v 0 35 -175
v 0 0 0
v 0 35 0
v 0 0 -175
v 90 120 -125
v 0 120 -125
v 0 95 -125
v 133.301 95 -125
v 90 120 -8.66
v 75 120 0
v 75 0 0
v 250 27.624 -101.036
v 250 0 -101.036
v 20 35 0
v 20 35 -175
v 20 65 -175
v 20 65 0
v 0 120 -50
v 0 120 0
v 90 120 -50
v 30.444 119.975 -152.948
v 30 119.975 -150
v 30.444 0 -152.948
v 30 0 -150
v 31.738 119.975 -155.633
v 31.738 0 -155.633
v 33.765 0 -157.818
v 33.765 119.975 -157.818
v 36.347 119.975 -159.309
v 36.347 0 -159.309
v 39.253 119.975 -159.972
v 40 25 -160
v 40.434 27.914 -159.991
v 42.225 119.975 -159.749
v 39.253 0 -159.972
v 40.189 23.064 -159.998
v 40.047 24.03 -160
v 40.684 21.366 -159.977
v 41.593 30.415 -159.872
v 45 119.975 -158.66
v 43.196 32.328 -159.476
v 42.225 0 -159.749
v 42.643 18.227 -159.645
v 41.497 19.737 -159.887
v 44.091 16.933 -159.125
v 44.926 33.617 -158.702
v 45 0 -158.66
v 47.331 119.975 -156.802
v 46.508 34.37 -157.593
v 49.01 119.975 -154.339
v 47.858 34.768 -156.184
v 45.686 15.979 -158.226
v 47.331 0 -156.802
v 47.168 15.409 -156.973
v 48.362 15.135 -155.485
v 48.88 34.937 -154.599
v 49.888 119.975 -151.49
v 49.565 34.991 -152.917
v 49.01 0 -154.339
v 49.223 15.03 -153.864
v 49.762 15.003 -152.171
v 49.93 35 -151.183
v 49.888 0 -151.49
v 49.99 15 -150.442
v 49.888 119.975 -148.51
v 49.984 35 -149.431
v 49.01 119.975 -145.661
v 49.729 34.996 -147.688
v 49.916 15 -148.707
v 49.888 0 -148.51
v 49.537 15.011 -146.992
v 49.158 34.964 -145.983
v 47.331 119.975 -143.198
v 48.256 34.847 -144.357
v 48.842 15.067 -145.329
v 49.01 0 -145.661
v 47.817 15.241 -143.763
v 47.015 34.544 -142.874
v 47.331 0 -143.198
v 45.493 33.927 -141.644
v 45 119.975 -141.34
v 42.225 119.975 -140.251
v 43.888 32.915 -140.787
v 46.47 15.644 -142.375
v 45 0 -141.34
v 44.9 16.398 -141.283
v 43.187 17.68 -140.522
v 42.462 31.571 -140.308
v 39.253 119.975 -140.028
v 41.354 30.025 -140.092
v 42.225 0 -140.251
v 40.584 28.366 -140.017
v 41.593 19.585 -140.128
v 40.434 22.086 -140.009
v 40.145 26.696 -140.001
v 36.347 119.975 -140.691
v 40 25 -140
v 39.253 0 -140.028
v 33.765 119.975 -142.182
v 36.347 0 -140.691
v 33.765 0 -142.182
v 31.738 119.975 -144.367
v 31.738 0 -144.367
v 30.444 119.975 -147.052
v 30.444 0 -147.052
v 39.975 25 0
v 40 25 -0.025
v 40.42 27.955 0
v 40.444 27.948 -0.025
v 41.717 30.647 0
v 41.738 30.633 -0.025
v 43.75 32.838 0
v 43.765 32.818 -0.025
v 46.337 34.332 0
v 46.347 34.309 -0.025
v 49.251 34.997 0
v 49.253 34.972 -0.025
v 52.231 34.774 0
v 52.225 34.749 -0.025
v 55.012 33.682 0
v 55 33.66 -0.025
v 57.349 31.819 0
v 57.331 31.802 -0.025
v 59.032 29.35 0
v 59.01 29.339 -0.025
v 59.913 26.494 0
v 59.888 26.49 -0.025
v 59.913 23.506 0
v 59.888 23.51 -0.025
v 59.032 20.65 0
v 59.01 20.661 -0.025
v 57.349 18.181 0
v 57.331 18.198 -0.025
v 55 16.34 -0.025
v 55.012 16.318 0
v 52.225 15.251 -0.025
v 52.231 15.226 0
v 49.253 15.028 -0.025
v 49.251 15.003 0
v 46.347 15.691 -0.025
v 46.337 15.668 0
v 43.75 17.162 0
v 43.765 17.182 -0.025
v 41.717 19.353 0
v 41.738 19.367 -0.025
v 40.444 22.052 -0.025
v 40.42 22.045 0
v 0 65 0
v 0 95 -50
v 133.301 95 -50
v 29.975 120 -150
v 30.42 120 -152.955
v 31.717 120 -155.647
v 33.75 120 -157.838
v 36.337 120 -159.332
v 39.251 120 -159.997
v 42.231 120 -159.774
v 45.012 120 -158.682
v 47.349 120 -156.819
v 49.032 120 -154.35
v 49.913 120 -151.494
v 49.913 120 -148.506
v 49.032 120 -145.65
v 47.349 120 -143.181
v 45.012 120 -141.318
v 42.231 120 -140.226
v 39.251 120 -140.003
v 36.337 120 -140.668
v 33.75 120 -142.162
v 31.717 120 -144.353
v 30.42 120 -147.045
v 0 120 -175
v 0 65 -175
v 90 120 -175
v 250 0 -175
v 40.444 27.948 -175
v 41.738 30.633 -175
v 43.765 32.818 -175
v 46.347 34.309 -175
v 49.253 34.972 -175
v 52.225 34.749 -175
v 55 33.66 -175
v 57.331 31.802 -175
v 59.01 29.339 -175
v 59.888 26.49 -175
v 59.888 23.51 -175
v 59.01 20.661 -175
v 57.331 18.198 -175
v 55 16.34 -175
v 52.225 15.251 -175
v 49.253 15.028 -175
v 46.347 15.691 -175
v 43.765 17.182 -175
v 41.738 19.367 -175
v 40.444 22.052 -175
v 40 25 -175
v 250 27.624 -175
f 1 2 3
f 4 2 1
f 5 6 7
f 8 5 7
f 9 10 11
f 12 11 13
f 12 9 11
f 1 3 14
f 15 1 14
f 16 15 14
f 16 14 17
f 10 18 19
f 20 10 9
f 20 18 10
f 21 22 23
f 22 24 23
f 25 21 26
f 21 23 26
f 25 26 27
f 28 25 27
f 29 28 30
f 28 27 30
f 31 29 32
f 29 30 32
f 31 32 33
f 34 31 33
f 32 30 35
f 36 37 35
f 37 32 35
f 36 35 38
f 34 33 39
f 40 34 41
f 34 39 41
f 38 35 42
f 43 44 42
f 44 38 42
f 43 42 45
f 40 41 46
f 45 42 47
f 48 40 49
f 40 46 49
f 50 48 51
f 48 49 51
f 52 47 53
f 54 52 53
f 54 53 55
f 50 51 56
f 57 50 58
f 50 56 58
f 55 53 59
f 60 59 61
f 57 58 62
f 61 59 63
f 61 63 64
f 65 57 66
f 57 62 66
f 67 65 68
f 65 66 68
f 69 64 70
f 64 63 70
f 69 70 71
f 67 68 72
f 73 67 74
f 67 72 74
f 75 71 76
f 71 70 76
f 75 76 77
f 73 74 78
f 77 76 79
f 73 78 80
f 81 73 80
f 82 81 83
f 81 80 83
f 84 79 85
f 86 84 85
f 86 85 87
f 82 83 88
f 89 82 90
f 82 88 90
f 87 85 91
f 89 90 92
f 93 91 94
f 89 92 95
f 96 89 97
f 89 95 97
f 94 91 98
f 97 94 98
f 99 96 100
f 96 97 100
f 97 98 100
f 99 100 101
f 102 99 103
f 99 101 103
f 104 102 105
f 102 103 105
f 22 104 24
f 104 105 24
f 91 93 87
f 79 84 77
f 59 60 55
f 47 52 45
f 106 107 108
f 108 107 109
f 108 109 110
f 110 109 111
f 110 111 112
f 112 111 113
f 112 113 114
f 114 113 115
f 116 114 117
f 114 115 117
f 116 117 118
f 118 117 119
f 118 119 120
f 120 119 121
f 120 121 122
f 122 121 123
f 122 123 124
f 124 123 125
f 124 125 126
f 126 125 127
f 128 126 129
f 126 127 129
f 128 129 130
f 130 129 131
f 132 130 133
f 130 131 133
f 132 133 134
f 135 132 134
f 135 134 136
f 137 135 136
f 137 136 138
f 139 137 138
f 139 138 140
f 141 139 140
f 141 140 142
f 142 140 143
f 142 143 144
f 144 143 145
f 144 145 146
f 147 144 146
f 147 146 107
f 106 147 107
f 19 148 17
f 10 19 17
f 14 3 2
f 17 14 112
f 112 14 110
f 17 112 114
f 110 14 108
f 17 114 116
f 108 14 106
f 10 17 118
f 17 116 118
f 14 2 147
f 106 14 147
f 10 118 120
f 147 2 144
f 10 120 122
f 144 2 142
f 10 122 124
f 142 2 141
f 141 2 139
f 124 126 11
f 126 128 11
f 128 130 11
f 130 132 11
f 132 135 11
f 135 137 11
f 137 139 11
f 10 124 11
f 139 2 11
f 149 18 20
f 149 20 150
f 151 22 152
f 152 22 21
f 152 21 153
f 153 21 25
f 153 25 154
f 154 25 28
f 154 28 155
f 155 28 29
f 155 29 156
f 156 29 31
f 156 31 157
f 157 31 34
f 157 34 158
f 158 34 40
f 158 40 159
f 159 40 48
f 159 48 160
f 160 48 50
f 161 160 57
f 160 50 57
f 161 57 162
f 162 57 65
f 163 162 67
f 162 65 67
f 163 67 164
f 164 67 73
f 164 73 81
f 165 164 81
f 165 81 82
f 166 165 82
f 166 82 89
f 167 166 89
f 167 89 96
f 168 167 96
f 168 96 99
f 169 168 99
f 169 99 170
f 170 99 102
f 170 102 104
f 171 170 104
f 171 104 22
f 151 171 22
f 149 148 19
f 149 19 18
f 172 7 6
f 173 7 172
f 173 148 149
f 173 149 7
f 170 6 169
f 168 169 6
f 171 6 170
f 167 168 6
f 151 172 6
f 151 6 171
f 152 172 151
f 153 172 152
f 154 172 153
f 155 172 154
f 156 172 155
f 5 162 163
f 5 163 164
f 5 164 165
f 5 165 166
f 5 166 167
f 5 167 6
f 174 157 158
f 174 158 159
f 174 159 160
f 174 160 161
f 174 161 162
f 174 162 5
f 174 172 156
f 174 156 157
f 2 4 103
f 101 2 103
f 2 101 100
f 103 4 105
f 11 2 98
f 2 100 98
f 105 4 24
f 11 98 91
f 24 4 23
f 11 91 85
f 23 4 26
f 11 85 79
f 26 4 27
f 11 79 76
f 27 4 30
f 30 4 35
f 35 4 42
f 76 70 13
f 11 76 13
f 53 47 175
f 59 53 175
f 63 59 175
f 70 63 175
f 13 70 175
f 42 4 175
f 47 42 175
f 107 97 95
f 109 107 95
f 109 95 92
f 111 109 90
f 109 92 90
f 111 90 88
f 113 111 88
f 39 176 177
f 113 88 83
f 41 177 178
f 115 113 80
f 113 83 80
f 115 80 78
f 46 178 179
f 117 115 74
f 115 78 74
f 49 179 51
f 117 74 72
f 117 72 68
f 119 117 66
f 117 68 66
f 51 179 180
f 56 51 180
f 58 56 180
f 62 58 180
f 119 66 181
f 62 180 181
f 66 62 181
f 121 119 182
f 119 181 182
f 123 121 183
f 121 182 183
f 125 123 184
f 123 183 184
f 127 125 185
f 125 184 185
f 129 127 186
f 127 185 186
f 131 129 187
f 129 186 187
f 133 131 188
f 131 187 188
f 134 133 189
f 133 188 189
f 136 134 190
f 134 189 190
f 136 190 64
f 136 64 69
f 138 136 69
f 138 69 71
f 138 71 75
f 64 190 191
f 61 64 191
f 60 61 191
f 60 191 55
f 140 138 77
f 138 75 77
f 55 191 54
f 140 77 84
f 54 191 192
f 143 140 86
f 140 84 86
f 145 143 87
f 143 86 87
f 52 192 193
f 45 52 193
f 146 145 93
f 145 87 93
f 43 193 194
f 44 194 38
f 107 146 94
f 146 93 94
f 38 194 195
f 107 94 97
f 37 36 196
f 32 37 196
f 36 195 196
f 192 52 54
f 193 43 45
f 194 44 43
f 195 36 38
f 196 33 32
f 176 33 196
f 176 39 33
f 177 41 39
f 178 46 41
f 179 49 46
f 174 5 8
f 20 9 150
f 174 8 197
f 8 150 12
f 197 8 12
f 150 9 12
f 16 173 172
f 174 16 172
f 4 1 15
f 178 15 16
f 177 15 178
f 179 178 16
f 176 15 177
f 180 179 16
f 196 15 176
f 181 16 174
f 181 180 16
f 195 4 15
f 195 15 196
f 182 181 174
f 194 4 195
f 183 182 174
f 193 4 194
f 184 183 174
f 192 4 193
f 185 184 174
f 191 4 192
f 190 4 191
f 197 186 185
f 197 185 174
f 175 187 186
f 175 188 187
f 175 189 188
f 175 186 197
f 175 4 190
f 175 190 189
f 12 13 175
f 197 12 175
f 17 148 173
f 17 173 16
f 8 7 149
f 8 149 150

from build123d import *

# Parameters (mm, degrees)
SKETCH1_W                        = 250
SKETCH1_H                        = 175
BOSS_EXTRUDE1_DEPTH              = 120
SKETCH3_W                        = 250
SKETCH3_H                        = 75
CUT_EXTRUDE1_DEPTH               = 25
CUT_EXTRUDE2_REACH               = 329.91
SKETCH4_W                        = 20
SKETCH4_H                        = 30
F_20_0MM_DOWEL_HOLE1_D           = 20
F_20_0MM_DOWEL_HOLE1_CSINK_D     = 20.05
F_20_0MM_DOWEL_HOLE1_CSINK_ANGLE = 90
F_20_0MM_DOWEL_HOLE2_D           = 20
F_20_0MM_DOWEL_HOLE2_CSINK_D     = 20.05
F_20_0MM_DOWEL_HOLE2_CSINK_ANGLE = 90
CUT_EXTRUDE3_REACH               = 329.91
CUT_EXTRUDE4_REACH               = 329.91


with BuildPart() as part:
    # Sketch1 → Boss-Extrude1 (new body)
    with BuildSketch(Plane(origin=(0, 0, 0), x_dir=(1, 0, 0), z_dir=(0, 1, 0))):
        with Locations((125, 87.5)):
            Rectangle(SKETCH1_W, SKETCH1_H)
    extrude(amount=BOSS_EXTRUDE1_DEPTH)

    # Sketch3 → Cut-Extrude1 (cut)
    with BuildSketch(Plane(origin=(0, 120, 0), x_dir=(1, 0, 0), z_dir=(0, 1, 0))):
        with Locations((125, 87.5)):
            Rectangle(SKETCH3_W, SKETCH3_H)
    extrude(amount=-CUT_EXTRUDE1_DEPTH, mode=Mode.SUBTRACT)

    # Sketch4 → Cut-Extrude2 (cut, up to next)
    with BuildSketch(Plane.XY, mode=Mode.PRIVATE) as cut_extrude2_sk1:
        with Locations((10, 50)):
            Rectangle(SKETCH4_W, SKETCH4_H)
    cut_extrude2_tool1 = extrude(cut_extrude2_sk1.sketch, amount=-CUT_EXTRUDE2_REACH, mode=Mode.PRIVATE) & part.part
    add(cut_extrude2_tool1.solids().sort_by_distance((10, 50, 0))[0], mode=Mode.SUBTRACT)

    # Ø20.0mm Dowel Hole1 (through all)
    with Locations(Plane.XY):
        with Locations((50, 25)):
            CounterSinkHole(F_20_0MM_DOWEL_HOLE1_D / 2, F_20_0MM_DOWEL_HOLE1_CSINK_D / 2, counter_sink_angle=F_20_0MM_DOWEL_HOLE1_CSINK_ANGLE)

    # Ø20.0mm Dowel Hole2 (through all)
    with Locations(Plane(origin=(0, 120, 0), x_dir=(1, 0, 0), z_dir=(0, 1, 0))):
        with Locations((40, 150)):
            CounterSinkHole(F_20_0MM_DOWEL_HOLE2_D / 2, F_20_0MM_DOWEL_HOLE2_CSINK_D / 2, counter_sink_angle=F_20_0MM_DOWEL_HOLE2_CSINK_ANGLE)

    # Sketch11 → Cut-Extrude3 (cut, up to next)
    with BuildSketch(Plane.XY, mode=Mode.PRIVATE) as cut_extrude3_sk1:
        Polygon((90, 120), (250, 27.62395693), (250, 120), align=None)
    cut_extrude3_tool1 = extrude(cut_extrude3_sk1.sketch, amount=-CUT_EXTRUDE3_REACH, mode=Mode.PRIVATE) & part.part
    add(cut_extrude3_tool1.solids().sort_by_distance((196.666667, 89.207986, 0))[0], mode=Mode.SUBTRACT)

    # Sketch12 → Cut-Extrude4 (cut, up to next)
    with BuildSketch(Plane(origin=(0, 120, 0), x_dir=(1, 0, 0), z_dir=(0, 1, 0)), mode=Mode.PRIVATE) as cut_extrude4_sk1:
        Polygon((75, 0), (250, 101.036297108), (250, 0), align=None)
    cut_extrude4_tool1 = extrude(cut_extrude4_sk1.sketch, amount=-CUT_EXTRUDE4_REACH, mode=Mode.PRIVATE) & part.part
    add(cut_extrude4_tool1.solids().sort_by_distance((191.666667, 120, -33.678766))[0], mode=Mode.SUBTRACT)


solid = part.part
